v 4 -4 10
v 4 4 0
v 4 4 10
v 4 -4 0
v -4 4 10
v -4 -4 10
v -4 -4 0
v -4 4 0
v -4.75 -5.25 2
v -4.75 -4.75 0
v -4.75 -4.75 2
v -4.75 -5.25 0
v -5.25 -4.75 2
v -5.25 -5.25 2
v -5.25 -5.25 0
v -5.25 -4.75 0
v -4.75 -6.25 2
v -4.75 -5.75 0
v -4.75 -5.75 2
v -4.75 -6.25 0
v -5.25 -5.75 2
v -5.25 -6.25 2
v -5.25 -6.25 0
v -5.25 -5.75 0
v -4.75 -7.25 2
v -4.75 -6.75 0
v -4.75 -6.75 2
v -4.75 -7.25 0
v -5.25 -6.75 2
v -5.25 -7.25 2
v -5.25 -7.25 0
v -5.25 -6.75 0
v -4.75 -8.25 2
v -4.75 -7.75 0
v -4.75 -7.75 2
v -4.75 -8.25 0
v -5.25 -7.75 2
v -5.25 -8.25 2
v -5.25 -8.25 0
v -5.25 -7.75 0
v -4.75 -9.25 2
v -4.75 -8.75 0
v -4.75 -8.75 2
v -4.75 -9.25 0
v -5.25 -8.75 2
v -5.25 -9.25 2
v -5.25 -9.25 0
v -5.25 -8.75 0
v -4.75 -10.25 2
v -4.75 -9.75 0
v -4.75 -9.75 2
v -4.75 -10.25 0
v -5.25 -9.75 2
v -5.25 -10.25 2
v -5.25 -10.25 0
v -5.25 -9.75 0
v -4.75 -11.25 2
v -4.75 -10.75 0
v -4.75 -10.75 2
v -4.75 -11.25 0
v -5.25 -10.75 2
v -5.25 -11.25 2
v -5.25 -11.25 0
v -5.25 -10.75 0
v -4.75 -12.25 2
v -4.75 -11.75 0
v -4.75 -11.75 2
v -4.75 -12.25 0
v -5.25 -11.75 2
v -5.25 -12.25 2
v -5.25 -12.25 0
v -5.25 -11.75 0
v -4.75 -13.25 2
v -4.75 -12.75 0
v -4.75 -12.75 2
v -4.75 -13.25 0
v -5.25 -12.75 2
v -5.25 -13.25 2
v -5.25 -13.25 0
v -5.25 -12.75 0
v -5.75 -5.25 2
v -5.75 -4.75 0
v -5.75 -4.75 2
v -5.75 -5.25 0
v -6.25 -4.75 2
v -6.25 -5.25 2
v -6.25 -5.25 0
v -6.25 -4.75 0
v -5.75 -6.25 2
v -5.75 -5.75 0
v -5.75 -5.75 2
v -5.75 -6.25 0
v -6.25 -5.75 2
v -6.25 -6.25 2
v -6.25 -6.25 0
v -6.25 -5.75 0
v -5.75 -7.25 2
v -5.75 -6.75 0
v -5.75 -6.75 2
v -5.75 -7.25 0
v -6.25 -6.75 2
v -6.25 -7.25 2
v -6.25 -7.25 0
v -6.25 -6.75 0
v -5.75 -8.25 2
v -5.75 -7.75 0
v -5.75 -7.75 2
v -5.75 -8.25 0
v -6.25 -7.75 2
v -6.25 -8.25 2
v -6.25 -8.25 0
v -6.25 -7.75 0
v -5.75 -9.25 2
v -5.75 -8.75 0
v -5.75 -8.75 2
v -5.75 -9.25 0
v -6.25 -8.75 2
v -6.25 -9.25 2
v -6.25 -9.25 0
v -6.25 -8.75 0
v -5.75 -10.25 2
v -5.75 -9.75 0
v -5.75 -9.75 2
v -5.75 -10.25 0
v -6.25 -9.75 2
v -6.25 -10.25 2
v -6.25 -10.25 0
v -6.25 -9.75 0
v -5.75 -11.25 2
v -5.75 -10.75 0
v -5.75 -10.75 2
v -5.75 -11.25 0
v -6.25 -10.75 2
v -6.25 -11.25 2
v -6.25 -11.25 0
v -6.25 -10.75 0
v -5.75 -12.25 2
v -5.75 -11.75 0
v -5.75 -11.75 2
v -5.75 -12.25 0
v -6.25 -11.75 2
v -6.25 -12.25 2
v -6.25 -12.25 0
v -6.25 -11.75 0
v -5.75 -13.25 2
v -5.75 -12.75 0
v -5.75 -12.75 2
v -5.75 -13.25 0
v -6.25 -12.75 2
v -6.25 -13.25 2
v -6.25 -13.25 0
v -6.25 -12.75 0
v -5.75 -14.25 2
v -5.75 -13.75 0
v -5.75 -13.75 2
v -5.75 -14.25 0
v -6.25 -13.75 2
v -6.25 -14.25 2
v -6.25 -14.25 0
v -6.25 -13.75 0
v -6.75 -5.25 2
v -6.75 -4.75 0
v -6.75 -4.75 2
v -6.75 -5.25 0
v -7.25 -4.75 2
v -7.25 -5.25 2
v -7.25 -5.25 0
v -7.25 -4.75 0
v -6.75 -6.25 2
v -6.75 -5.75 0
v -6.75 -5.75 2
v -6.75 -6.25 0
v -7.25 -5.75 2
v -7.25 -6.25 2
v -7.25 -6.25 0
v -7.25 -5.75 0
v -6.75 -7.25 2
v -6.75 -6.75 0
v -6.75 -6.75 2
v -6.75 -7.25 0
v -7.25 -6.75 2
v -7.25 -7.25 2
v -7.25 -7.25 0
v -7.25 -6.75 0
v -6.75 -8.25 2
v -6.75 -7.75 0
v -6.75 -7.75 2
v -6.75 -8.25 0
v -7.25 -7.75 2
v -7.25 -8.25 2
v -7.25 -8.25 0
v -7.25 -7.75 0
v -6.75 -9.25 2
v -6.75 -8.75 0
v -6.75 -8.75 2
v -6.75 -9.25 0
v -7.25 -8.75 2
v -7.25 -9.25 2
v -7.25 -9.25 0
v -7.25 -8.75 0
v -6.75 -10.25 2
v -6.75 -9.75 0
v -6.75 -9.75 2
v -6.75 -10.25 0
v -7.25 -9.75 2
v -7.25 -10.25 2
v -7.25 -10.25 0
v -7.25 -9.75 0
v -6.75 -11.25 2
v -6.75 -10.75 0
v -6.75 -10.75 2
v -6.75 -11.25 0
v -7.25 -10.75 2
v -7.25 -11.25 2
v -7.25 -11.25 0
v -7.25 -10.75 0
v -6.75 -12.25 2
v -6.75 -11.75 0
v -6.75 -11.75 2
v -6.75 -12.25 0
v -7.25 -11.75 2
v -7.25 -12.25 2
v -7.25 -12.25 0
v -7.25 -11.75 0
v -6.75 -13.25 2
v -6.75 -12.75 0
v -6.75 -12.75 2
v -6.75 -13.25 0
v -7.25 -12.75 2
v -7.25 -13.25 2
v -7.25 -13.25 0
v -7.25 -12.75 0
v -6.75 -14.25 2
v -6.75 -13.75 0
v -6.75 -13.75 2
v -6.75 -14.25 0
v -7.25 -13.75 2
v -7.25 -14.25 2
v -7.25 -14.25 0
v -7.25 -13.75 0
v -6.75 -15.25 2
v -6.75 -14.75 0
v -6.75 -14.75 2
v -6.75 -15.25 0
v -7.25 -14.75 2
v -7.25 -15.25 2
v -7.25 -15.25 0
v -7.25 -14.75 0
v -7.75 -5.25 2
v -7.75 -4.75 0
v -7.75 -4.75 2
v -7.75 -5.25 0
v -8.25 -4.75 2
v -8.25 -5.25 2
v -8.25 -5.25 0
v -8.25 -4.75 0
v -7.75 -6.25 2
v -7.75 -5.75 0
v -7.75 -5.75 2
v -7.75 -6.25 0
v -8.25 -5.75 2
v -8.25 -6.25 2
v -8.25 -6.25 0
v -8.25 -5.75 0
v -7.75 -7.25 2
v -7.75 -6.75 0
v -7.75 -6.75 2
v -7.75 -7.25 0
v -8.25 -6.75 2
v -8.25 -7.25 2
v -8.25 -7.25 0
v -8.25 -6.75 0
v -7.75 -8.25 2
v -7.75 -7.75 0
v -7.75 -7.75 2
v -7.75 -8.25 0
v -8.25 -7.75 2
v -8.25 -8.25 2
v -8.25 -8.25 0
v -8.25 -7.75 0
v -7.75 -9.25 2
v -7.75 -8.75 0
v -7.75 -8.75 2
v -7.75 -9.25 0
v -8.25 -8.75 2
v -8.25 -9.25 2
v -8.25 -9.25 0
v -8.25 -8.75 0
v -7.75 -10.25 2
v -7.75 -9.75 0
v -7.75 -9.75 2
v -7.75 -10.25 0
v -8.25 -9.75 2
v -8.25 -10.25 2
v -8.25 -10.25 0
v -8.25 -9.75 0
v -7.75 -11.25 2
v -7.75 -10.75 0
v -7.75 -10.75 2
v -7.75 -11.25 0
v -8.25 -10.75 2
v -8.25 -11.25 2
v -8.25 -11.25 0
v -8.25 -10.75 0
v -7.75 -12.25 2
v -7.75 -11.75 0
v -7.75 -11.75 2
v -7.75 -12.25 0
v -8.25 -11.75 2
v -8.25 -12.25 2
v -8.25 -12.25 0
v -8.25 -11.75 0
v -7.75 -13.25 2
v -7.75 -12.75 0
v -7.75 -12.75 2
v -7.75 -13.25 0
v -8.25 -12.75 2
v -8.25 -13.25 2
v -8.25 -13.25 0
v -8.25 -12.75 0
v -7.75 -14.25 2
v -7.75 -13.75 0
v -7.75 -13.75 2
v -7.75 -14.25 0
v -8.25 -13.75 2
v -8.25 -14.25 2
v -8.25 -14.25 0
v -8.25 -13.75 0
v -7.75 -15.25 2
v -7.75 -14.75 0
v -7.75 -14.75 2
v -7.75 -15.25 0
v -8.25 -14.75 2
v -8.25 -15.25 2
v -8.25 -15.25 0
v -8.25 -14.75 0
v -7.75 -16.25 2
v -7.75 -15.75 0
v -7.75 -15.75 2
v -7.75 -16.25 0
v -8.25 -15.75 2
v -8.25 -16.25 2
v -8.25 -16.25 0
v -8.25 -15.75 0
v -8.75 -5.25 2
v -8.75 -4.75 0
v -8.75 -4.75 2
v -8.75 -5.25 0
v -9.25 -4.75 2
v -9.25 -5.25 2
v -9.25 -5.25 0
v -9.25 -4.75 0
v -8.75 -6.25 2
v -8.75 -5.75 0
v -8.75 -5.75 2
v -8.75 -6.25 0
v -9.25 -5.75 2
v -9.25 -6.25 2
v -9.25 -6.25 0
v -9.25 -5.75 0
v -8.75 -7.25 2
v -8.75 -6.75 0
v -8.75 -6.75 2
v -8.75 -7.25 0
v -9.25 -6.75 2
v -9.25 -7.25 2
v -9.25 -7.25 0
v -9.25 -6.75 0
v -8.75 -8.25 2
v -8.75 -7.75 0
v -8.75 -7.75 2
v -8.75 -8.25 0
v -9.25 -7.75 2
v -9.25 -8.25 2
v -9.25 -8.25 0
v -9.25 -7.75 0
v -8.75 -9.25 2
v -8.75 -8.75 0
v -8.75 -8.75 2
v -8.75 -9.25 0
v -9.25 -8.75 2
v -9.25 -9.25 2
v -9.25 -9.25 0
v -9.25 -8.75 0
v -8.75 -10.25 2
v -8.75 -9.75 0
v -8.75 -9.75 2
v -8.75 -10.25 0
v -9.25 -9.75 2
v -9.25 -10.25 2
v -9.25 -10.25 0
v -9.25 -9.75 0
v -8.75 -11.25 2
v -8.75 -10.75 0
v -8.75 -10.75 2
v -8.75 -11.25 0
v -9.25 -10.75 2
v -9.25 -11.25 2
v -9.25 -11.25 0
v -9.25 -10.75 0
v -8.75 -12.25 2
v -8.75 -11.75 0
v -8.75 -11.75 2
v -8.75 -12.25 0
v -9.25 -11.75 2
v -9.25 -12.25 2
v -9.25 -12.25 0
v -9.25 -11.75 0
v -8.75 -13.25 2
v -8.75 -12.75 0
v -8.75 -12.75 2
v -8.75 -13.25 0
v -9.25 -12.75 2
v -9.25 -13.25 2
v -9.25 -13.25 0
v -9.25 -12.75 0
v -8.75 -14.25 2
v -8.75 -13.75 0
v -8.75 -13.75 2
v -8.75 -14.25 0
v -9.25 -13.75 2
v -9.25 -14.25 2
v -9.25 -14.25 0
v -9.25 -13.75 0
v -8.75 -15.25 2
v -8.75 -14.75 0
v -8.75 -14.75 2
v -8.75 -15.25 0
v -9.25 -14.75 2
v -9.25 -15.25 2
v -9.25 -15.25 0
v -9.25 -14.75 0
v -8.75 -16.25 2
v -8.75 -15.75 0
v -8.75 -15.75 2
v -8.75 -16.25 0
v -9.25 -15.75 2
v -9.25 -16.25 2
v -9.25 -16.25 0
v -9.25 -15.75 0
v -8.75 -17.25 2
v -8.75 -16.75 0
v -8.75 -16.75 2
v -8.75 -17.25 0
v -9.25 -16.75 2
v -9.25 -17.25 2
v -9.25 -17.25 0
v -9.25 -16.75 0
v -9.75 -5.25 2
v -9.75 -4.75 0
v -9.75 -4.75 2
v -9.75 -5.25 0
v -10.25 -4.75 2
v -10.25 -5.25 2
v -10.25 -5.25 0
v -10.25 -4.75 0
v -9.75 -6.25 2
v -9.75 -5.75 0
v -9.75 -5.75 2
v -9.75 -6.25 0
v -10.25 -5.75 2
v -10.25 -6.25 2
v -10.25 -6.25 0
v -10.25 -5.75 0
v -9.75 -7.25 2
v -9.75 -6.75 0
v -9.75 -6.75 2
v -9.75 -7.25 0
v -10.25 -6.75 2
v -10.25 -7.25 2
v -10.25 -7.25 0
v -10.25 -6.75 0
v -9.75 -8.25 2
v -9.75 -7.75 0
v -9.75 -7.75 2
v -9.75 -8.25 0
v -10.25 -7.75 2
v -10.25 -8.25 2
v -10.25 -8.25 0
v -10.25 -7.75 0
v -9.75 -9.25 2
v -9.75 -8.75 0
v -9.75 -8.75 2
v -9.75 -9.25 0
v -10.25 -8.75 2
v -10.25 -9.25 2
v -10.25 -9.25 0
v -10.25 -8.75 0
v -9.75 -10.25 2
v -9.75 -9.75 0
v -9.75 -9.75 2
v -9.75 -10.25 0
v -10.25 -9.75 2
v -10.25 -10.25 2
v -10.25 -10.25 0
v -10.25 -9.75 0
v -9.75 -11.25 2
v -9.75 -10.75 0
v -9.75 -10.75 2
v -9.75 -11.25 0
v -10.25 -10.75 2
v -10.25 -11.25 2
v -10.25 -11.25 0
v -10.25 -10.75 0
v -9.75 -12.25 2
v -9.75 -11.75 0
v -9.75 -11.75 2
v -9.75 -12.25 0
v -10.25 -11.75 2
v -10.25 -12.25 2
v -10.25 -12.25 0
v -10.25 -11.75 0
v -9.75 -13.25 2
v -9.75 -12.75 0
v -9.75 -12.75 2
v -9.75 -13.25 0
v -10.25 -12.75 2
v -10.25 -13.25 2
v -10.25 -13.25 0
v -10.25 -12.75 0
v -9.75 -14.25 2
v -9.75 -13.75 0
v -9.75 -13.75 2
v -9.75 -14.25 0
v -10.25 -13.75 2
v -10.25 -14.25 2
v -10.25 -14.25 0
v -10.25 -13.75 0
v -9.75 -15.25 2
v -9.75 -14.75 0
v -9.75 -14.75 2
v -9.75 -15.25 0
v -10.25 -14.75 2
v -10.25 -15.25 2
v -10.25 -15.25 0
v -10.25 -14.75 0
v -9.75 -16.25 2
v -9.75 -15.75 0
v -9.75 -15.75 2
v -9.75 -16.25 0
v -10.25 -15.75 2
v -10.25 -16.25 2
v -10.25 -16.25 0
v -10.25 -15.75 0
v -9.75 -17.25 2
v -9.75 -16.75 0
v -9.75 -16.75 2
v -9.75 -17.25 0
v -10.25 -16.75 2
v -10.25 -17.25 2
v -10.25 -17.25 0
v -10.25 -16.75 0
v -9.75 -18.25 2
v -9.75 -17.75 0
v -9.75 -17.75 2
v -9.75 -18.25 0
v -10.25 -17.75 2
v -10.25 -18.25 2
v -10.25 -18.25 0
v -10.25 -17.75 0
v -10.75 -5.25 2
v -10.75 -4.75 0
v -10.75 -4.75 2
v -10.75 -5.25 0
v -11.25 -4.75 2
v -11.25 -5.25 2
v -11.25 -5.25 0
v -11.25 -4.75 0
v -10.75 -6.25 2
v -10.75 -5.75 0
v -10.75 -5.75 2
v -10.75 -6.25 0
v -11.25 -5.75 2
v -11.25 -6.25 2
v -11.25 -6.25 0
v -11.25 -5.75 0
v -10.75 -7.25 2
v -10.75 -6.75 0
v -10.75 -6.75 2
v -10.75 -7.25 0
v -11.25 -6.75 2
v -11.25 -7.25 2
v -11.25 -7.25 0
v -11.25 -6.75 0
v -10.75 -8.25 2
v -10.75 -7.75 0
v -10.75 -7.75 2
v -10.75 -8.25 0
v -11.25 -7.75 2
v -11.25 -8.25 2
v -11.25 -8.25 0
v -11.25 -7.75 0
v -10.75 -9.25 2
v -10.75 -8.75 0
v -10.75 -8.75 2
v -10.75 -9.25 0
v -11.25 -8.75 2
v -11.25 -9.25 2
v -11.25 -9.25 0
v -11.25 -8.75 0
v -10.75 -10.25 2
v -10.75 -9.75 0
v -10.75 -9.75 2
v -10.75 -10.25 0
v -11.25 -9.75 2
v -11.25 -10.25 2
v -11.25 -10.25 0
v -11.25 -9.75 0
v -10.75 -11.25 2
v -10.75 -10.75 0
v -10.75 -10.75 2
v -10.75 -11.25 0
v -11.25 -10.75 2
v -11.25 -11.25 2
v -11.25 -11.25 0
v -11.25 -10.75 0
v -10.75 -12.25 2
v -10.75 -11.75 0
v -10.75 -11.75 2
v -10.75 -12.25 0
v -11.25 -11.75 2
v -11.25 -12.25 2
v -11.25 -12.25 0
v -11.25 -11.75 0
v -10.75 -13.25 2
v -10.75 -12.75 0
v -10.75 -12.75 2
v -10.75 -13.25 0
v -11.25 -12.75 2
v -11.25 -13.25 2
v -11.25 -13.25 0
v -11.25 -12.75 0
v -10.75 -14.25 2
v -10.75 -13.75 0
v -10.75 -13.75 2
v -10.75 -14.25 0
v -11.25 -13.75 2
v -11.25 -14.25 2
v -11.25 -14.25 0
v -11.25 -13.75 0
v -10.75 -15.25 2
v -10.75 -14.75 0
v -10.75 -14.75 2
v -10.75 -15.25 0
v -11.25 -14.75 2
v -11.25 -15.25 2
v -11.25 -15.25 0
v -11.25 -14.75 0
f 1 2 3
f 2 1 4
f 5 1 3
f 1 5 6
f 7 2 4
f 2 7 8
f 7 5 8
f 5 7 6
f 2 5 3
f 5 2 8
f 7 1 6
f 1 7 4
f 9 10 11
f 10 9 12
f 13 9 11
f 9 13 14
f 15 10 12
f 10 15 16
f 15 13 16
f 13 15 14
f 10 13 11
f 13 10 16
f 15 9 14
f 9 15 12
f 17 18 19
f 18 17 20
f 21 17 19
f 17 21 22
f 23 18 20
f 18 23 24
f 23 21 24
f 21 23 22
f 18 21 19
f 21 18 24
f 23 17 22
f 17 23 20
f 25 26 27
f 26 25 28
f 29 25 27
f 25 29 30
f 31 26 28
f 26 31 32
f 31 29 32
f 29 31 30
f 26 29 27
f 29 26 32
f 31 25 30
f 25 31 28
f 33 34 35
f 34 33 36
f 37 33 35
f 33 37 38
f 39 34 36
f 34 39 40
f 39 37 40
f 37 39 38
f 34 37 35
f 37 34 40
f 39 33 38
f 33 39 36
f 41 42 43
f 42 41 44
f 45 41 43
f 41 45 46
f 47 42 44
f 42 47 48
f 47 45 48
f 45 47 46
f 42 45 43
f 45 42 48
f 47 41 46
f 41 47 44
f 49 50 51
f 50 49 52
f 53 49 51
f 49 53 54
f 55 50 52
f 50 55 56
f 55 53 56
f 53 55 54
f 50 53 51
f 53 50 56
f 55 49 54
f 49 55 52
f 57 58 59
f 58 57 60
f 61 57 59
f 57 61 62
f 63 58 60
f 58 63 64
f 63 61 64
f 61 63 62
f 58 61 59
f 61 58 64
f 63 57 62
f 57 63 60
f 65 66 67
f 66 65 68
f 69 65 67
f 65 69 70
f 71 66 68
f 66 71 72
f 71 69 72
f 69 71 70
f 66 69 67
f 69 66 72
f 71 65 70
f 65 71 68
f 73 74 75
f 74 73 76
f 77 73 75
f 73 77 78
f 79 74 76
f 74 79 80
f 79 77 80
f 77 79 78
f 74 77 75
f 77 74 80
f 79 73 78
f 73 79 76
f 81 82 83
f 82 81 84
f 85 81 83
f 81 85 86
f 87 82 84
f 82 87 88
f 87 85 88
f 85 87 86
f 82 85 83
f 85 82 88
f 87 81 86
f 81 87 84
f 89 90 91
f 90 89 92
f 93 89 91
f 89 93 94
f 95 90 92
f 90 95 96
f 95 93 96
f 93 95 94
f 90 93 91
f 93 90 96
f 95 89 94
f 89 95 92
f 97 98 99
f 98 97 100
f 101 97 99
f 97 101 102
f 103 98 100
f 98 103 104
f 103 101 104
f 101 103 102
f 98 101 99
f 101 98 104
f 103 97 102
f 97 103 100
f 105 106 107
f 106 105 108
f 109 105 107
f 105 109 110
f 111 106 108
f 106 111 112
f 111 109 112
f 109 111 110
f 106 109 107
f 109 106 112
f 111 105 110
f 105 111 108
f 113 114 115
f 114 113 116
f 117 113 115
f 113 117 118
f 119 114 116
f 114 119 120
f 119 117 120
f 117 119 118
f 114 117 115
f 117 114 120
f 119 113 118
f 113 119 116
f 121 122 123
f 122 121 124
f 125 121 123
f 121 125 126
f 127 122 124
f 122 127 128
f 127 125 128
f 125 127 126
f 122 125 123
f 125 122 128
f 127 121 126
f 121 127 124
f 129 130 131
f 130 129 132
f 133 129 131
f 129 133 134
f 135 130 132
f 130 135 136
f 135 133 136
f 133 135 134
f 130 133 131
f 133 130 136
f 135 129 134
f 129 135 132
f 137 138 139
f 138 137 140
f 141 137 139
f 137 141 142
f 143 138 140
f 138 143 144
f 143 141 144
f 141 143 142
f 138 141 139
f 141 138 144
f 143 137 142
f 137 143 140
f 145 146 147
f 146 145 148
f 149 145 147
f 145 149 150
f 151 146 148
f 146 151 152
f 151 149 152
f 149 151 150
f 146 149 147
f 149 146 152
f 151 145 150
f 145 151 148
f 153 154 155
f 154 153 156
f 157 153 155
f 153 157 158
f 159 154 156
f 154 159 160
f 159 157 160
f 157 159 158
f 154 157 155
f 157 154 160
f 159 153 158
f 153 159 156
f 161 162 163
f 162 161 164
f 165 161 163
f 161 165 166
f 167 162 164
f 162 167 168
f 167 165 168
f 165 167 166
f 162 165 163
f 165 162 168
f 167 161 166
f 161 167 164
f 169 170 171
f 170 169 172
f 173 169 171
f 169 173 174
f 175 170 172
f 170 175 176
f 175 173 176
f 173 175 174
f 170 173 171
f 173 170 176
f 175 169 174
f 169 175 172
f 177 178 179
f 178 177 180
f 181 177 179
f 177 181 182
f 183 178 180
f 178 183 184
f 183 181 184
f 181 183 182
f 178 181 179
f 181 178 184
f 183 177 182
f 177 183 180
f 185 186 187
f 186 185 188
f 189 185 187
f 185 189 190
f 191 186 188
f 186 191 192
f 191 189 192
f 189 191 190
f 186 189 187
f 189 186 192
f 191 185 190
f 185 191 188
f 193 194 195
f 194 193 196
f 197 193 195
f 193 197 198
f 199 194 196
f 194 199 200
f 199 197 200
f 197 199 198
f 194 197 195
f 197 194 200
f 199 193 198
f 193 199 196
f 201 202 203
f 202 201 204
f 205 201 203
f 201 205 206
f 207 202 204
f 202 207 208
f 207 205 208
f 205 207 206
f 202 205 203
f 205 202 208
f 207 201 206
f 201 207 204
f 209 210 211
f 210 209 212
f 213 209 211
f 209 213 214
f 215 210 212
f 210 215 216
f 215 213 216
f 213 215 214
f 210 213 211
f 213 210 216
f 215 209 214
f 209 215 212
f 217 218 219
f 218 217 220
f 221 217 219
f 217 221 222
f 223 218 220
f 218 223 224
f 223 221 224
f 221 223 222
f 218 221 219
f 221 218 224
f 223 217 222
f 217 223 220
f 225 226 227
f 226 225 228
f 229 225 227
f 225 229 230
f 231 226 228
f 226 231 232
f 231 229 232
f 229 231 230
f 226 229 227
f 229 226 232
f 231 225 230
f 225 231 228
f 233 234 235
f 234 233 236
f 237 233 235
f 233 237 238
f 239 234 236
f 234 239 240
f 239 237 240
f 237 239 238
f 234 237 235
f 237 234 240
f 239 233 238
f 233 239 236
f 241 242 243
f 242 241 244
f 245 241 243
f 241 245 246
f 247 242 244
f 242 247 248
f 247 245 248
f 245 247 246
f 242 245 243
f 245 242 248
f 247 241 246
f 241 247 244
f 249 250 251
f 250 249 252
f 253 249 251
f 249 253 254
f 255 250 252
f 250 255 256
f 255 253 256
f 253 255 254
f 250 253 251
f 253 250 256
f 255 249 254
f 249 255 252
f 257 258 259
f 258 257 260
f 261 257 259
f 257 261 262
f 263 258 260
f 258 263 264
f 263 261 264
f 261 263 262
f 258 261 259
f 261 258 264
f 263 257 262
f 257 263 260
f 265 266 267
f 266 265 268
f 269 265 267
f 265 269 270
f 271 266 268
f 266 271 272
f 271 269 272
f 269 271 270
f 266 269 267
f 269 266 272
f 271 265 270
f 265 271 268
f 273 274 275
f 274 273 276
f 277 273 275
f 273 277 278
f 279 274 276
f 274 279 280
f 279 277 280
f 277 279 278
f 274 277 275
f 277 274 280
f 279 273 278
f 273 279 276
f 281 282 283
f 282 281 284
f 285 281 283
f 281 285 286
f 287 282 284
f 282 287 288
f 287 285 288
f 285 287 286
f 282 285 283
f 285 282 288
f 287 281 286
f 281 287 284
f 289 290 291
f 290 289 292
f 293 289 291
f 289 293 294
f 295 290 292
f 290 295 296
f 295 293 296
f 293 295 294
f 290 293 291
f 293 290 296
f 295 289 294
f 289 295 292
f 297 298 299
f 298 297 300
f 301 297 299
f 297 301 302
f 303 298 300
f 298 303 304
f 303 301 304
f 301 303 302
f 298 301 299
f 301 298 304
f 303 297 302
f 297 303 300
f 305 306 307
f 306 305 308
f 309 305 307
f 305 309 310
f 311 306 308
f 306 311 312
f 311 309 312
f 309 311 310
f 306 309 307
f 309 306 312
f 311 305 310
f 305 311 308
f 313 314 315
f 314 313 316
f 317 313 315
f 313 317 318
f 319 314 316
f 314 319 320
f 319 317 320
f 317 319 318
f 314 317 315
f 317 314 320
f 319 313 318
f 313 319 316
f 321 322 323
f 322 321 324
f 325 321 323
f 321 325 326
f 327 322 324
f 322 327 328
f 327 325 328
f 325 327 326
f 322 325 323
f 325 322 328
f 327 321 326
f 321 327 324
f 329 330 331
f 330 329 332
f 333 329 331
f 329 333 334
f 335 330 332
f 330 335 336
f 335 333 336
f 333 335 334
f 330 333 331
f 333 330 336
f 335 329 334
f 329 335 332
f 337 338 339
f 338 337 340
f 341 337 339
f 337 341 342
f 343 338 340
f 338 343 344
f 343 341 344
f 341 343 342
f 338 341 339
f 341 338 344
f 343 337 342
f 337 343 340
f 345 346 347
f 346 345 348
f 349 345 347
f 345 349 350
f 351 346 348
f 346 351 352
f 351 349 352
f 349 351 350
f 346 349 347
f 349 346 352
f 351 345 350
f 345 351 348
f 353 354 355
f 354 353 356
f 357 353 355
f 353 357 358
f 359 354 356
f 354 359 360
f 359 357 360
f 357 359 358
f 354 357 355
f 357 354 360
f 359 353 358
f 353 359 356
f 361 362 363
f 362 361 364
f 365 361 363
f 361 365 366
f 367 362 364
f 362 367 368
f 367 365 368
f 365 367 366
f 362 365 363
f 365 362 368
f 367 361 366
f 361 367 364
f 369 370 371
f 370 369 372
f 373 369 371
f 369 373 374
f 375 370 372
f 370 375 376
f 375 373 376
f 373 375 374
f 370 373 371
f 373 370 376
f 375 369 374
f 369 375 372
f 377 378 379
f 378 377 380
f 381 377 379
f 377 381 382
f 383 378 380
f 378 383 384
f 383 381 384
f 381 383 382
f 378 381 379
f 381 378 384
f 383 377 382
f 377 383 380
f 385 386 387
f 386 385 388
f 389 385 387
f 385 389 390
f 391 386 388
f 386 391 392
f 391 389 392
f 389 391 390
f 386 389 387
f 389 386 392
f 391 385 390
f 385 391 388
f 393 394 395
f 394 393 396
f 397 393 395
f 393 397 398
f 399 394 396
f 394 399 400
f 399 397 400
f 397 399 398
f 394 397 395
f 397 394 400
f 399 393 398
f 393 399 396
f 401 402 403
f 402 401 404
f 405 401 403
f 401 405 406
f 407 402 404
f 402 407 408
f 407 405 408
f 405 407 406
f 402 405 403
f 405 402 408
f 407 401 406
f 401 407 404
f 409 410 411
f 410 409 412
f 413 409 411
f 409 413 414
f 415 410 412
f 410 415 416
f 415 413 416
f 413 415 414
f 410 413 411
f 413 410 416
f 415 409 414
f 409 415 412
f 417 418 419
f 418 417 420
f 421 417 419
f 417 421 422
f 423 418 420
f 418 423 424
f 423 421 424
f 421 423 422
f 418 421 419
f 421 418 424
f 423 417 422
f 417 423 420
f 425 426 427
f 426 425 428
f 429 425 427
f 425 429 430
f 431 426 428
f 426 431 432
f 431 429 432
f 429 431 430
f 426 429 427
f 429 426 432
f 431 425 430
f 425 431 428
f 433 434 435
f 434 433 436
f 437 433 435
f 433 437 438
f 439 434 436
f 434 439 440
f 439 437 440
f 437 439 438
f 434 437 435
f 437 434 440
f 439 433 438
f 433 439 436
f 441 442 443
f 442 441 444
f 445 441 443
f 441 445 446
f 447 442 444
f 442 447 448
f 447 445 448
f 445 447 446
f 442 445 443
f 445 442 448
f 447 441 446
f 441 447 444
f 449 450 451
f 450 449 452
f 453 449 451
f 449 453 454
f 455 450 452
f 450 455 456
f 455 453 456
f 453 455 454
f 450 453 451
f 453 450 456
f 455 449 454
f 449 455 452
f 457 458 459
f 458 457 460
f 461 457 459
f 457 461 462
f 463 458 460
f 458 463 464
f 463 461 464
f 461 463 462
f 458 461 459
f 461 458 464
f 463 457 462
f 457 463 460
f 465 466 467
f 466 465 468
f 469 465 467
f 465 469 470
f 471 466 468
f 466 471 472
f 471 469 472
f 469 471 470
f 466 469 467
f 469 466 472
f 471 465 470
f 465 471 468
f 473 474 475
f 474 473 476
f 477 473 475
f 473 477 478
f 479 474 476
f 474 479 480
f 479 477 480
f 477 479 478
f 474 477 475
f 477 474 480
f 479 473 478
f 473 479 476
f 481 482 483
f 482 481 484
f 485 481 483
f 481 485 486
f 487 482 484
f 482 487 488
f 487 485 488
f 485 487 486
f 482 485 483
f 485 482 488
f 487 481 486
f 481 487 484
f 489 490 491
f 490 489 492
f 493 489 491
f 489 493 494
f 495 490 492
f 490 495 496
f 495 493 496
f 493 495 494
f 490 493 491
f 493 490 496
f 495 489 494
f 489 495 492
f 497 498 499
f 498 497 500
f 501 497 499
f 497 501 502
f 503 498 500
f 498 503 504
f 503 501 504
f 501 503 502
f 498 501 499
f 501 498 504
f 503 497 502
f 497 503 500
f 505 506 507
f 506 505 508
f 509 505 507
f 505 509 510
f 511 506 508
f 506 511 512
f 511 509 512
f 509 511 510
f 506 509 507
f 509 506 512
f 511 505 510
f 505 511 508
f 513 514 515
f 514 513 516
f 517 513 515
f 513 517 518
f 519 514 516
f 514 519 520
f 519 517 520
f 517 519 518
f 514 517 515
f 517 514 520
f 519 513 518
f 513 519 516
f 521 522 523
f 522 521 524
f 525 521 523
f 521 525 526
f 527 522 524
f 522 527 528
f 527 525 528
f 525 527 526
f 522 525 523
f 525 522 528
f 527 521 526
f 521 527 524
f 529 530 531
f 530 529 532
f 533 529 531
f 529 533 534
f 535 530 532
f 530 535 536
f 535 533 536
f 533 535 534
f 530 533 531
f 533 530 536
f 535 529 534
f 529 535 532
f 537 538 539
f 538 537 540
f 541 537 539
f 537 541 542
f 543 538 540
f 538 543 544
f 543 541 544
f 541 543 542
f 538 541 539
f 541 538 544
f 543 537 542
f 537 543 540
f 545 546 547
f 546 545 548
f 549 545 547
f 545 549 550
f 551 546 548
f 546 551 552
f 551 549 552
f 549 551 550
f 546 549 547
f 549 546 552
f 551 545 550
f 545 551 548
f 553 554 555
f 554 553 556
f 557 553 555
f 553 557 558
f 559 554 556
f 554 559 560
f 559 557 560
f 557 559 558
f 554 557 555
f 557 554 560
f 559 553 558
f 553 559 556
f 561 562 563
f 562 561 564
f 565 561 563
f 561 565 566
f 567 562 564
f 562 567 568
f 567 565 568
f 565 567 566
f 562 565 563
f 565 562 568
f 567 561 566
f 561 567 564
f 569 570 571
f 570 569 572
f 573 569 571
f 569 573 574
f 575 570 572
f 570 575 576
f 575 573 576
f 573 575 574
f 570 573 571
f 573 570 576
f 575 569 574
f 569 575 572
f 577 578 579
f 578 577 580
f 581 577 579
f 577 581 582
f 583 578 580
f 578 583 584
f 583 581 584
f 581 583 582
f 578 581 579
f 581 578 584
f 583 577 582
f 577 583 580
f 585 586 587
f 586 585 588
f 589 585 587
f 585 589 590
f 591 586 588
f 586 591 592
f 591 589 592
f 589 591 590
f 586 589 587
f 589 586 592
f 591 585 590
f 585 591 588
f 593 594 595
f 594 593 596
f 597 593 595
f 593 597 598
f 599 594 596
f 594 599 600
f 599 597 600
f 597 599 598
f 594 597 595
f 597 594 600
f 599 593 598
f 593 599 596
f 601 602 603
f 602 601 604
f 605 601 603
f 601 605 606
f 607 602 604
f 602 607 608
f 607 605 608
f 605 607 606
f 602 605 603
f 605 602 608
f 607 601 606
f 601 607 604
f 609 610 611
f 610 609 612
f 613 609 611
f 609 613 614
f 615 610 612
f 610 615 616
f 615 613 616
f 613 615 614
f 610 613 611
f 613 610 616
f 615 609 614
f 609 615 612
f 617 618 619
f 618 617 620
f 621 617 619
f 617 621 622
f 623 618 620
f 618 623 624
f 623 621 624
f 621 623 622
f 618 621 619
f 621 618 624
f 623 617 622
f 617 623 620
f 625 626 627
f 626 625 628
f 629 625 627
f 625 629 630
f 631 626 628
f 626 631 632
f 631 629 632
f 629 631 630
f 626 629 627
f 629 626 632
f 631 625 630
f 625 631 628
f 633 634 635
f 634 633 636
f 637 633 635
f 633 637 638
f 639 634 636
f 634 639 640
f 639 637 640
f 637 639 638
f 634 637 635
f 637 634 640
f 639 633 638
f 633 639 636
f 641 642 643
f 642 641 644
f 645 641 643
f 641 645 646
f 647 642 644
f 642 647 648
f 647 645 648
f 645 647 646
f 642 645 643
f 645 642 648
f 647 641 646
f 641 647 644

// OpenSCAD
translate([0, 0, 5]) color([0,1,0,0.9]) cube([8, 8, 10], center=true);
translate([-5.0, -5.0, 1]) color([1,0,0]) cube([0.5, 0.5, 2], center=true);
translate([-5.0, -6.0, 1]) color([1,0,0]) cube([0.5, 0.5, 2], center=true);
translate([-5.0, -7.0, 1]) color([1,0,0]) cube([0.5, 0.5, 2], center=true);
translate([-5.0, -8.0, 1]) color([1,0,0]) cube([0.5, 0.5, 2], center=true);
translate([-5.0, -9.0, 1]) color([1,0,0]) cube([0.5, 0.5, 2], center=true);
translate([-5.0, -10.0, 1]) color([1,0,0]) cube([0.5, 0.5, 2], center=true);
translate([-5.0, -11.0, 1]) color([1,0,0]) cube([0.5, 0.5, 2], center=true);
translate([-5.0, -12.0, 1]) color([1,0,0]) cube([0.5, 0.5, 2], center=true);
translate([-5.0, -13.0, 1]) color([1,0,0]) cube([0.5, 0.5, 2], center=true);
translate([-6.0, -5.0, 1]) color([1,0,0]) cube([0.5, 0.5, 2], center=true);
translate([-6.0, -6.0, 1]) color([1,0,0]) cube([0.5, 0.5, 2], center=true);
translate([-6.0, -7.0, 1]) color([1,0,0]) cube([0.5, 0.5, 2], center=true);
translate([-6.0, -8.0, 1]) color([1,0,0]) cube([0.5, 0.5, 2], center=true);
translate([-6.0, -9.0, 1]) color([1,0,0]) cube([0.5, 0.5, 2], center=true);
translate([-6.0, -10.0, 1]) color([1,0,0]) cube([0.5, 0.5, 2], center=true);
translate([-6.0, -11.0, 1]) color([1,0,0]) cube([0.5, 0.5, 2], center=true);
translate([-6.0, -12.0, 1]) color([1,0,0]) cube([0.5, 0.5, 2], center=true);
translate([-6.0, -13.0, 1]) color([1,0,0]) cube([0.5, 0.5, 2], center=true);
translate([-6.0, -14.0, 1]) color([1,0,0]) cube([0.5, 0.5, 2], center=true);
translate([-7.0, -5.0, 1]) color([1,0,0]) cube([0.5, 0.5, 2], center=true);
translate([-7.0, -6.0, 1]) color([1,0,0]) cube([0.5, 0.5, 2], center=true);
translate([-7.0, -7.0, 1]) color([1,0,0]) cube([0.5, 0.5, 2], center=true);
translate([-7.0, -8.0, 1]) color([1,0,0]) cube([0.5, 0.5, 2], center=true);
translate([-7.0, -9.0, 1]) color([1,0,0]) cube([0.5, 0.5, 2], center=true);
translate([-7.0, -10.0, 1]) color([1,0,0]) cube([0.5, 0.5, 2], center=true);
translate([-7.0, -11.0, 1]) color([1,0,0]) cube([0.5, 0.5, 2], center=true);
translate([-7.0, -12.0, 1]) color([1,0,0]) cube([0.5, 0.5, 2], center=true);
translate([-7.0, -13.0, 1]) color([1,0,0]) cube([0.5, 0.5, 2], center=true);
translate([-7.0, -14.0, 1]) color([1,0,0]) cube([0.5, 0.5, 2], center=true);
translate([-7.0, -15.0, 1]) color([1,0,0]) cube([0.5, 0.5, 2], center=true);
translate([-8.0, -5.0, 1]) color([1,0,0]) cube([0.5, 0.5, 2], center=true);
translate([-8.0, -6.0, 1]) color([1,0,0]) cube([0.5, 0.5, 2], center=true);
translate([-8.0, -7.0, 1]) color([1,0,0]) cube([0.5, 0.5, 2], center=true);
translate([-8.0, -8.0, 1]) color([1,0,0]) cube([0.5, 0.5, 2], center=true);
translate([-8.0, -9.0, 1]) color([1,0,0]) cube([0.5, 0.5, 2], center=true);
translate([-8.0, -10.0, 1]) color([1,0,0]) cube([0.5, 0.5, 2], center=true);
translate([-8.0, -11.0, 1]) color([1,0,0]) cube([0.5, 0.5, 2], center=true);
translate([-8.0, -12.0, 1]) color([1,0,0]) cube([0.5, 0.5, 2], center=true);
translate([-8.0, -13.0, 1]) color([1,0,0]) cube([0.5, 0.5, 2], center=true);
translate([-8.0, -14.0, 1]) color([1,0,0]) cube([0.5, 0.5, 2], center=true);
translate([-8.0, -15.0, 1]) color([1,0,0]) cube([0.5, 0.5, 2], center=true);
translate([-8.0, -16.0, 1]) color([1,0,0]) cube([0.5, 0.5, 2], center=true);
translate([-9.0, -5.0, 1]) color([1,0,0]) cube([0.5, 0.5, 2], center=true);
translate([-9.0, -6.0, 1]) color([1,0,0]) cube([0.5, 0.5, 2], center=true);
translate([-9.0, -7.0, 1]) color([1,0,0]) cube([0.5, 0.5, 2], center=true);
translate([-9.0, -8.0, 1]) color([1,0,0]) cube([0.5, 0.5, 2], center=true);
translate([-9.0, -9.0, 1]) color([1,0,0]) cube([0.5, 0.5, 2], center=true);
translate([-9.0, -10.0, 1]) color([1,0,0]) cube([0.5, 0.5, 2], center=true);
translate([-9.0, -11.0, 1]) color([1,0,0]) cube([0.5, 0.5, 2], center=true);
translate([-9.0, -12.0, 1]) color([1,0,0]) cube([0.5, 0.5, 2], center=true);
translate([-9.0, -13.0, 1]) color([1,0,0]) cube([0.5, 0.5, 2], center=true);
translate([-9.0, -14.0, 1]) color([1,0,0]) cube([0.5, 0.5, 2], center=true);
translate([-9.0, -15.0, 1]) color([1,0,0]) cube([0.5, 0.5, 2], center=true);
translate([-9.0, -16.0, 1]) color([1,0,0]) cube([0.5, 0.5, 2], center=true);
translate([-9.0, -17.0, 1]) color([1,0,0]) cube([0.5, 0.5, 2], center=true);
translate([-10.0, -5.0, 1]) color([1,0,0]) cube([0.5, 0.5, 2], center=true);
translate([-10.0, -6.0, 1]) color([1,0,0]) cube([0.5, 0.5, 2], center=true);
translate([-10.0, -7.0, 1]) color([1,0,0]) cube([0.5, 0.5, 2], center=true);
translate([-10.0, -8.0, 1]) color([1,0,0]) cube([0.5, 0.5, 2], center=true);
translate([-10.0, -9.0, 1]) color([1,0,0]) cube([0.5, 0.5, 2], center=true);
translate([-10.0, -10.0, 1]) color([1,0,0]) cube([0.5, 0.5, 2], center=true);
translate([-10.0, -11.0, 1]) color([1,0,0]) cube([0.5, 0.5, 2], center=true);
translate([-10.0, -12.0, 1]) color([1,0,0]) cube([0.5, 0.5, 2], center=true);
translate([-10.0, -13.0, 1]) color([1,0,0]) cube([0.5, 0.5, 2], center=true);
translate([-10.0, -14.0, 1]) color([1,0,0]) cube([0.5, 0.5, 2], center=true);
translate([-10.0, -15.0, 1]) color([1,0,0]) cube([0.5, 0.5, 2], center=true);
translate([-10.0, -16.0, 1]) color([1,0,0]) cube([0.5, 0.5, 2], center=true);
translate([-10.0, -17.0, 1]) color([1,0,0]) cube([0.5, 0.5, 2], center=true);
translate([-10.0, -18.0, 1]) color([1,0,0]) cube([0.5, 0.5, 2], center=true);
translate([-11.0, -5.0, 1]) color([1,0,0]) cube([0.5, 0.5, 2], center=true);
translate([-11.0, -6.0, 1]) color([1,0,0]) cube([0.5, 0.5, 2], center=true);
translate([-11.0, -7.0, 1]) color([1,0,0]) cube([0.5, 0.5, 2], center=true);
translate([-11.0, -8.0, 1]) color([1,0,0]) cube([0.5, 0.5, 2], center=true);
translate([-11.0, -9.0, 1]) color([1,0,0]) cube([0.5, 0.5, 2], center=true);
translate([-11.0, -10.0, 1]) color([1,0,0]) cube([0.5, 0.5, 2], center=true);
translate([-11.0, -11.0, 1]) color([1,0,0]) cube([0.5, 0.5, 2], center=true);
translate([-11.0, -12.0, 1]) color([1,0,0]) cube([0.5, 0.5, 2], center=true);
translate([-11.0, -13.0, 1]) color([1,0,0]) cube([0.5, 0.5, 2], center=true);
translate([-11.0, -14.0, 1]) color([1,0,0]) cube([0.5, 0.5, 2], center=true);
translate([-11.0, -15.0, 1]) color([1,0,0]) cube([0.5, 0.5, 2], center=true);
